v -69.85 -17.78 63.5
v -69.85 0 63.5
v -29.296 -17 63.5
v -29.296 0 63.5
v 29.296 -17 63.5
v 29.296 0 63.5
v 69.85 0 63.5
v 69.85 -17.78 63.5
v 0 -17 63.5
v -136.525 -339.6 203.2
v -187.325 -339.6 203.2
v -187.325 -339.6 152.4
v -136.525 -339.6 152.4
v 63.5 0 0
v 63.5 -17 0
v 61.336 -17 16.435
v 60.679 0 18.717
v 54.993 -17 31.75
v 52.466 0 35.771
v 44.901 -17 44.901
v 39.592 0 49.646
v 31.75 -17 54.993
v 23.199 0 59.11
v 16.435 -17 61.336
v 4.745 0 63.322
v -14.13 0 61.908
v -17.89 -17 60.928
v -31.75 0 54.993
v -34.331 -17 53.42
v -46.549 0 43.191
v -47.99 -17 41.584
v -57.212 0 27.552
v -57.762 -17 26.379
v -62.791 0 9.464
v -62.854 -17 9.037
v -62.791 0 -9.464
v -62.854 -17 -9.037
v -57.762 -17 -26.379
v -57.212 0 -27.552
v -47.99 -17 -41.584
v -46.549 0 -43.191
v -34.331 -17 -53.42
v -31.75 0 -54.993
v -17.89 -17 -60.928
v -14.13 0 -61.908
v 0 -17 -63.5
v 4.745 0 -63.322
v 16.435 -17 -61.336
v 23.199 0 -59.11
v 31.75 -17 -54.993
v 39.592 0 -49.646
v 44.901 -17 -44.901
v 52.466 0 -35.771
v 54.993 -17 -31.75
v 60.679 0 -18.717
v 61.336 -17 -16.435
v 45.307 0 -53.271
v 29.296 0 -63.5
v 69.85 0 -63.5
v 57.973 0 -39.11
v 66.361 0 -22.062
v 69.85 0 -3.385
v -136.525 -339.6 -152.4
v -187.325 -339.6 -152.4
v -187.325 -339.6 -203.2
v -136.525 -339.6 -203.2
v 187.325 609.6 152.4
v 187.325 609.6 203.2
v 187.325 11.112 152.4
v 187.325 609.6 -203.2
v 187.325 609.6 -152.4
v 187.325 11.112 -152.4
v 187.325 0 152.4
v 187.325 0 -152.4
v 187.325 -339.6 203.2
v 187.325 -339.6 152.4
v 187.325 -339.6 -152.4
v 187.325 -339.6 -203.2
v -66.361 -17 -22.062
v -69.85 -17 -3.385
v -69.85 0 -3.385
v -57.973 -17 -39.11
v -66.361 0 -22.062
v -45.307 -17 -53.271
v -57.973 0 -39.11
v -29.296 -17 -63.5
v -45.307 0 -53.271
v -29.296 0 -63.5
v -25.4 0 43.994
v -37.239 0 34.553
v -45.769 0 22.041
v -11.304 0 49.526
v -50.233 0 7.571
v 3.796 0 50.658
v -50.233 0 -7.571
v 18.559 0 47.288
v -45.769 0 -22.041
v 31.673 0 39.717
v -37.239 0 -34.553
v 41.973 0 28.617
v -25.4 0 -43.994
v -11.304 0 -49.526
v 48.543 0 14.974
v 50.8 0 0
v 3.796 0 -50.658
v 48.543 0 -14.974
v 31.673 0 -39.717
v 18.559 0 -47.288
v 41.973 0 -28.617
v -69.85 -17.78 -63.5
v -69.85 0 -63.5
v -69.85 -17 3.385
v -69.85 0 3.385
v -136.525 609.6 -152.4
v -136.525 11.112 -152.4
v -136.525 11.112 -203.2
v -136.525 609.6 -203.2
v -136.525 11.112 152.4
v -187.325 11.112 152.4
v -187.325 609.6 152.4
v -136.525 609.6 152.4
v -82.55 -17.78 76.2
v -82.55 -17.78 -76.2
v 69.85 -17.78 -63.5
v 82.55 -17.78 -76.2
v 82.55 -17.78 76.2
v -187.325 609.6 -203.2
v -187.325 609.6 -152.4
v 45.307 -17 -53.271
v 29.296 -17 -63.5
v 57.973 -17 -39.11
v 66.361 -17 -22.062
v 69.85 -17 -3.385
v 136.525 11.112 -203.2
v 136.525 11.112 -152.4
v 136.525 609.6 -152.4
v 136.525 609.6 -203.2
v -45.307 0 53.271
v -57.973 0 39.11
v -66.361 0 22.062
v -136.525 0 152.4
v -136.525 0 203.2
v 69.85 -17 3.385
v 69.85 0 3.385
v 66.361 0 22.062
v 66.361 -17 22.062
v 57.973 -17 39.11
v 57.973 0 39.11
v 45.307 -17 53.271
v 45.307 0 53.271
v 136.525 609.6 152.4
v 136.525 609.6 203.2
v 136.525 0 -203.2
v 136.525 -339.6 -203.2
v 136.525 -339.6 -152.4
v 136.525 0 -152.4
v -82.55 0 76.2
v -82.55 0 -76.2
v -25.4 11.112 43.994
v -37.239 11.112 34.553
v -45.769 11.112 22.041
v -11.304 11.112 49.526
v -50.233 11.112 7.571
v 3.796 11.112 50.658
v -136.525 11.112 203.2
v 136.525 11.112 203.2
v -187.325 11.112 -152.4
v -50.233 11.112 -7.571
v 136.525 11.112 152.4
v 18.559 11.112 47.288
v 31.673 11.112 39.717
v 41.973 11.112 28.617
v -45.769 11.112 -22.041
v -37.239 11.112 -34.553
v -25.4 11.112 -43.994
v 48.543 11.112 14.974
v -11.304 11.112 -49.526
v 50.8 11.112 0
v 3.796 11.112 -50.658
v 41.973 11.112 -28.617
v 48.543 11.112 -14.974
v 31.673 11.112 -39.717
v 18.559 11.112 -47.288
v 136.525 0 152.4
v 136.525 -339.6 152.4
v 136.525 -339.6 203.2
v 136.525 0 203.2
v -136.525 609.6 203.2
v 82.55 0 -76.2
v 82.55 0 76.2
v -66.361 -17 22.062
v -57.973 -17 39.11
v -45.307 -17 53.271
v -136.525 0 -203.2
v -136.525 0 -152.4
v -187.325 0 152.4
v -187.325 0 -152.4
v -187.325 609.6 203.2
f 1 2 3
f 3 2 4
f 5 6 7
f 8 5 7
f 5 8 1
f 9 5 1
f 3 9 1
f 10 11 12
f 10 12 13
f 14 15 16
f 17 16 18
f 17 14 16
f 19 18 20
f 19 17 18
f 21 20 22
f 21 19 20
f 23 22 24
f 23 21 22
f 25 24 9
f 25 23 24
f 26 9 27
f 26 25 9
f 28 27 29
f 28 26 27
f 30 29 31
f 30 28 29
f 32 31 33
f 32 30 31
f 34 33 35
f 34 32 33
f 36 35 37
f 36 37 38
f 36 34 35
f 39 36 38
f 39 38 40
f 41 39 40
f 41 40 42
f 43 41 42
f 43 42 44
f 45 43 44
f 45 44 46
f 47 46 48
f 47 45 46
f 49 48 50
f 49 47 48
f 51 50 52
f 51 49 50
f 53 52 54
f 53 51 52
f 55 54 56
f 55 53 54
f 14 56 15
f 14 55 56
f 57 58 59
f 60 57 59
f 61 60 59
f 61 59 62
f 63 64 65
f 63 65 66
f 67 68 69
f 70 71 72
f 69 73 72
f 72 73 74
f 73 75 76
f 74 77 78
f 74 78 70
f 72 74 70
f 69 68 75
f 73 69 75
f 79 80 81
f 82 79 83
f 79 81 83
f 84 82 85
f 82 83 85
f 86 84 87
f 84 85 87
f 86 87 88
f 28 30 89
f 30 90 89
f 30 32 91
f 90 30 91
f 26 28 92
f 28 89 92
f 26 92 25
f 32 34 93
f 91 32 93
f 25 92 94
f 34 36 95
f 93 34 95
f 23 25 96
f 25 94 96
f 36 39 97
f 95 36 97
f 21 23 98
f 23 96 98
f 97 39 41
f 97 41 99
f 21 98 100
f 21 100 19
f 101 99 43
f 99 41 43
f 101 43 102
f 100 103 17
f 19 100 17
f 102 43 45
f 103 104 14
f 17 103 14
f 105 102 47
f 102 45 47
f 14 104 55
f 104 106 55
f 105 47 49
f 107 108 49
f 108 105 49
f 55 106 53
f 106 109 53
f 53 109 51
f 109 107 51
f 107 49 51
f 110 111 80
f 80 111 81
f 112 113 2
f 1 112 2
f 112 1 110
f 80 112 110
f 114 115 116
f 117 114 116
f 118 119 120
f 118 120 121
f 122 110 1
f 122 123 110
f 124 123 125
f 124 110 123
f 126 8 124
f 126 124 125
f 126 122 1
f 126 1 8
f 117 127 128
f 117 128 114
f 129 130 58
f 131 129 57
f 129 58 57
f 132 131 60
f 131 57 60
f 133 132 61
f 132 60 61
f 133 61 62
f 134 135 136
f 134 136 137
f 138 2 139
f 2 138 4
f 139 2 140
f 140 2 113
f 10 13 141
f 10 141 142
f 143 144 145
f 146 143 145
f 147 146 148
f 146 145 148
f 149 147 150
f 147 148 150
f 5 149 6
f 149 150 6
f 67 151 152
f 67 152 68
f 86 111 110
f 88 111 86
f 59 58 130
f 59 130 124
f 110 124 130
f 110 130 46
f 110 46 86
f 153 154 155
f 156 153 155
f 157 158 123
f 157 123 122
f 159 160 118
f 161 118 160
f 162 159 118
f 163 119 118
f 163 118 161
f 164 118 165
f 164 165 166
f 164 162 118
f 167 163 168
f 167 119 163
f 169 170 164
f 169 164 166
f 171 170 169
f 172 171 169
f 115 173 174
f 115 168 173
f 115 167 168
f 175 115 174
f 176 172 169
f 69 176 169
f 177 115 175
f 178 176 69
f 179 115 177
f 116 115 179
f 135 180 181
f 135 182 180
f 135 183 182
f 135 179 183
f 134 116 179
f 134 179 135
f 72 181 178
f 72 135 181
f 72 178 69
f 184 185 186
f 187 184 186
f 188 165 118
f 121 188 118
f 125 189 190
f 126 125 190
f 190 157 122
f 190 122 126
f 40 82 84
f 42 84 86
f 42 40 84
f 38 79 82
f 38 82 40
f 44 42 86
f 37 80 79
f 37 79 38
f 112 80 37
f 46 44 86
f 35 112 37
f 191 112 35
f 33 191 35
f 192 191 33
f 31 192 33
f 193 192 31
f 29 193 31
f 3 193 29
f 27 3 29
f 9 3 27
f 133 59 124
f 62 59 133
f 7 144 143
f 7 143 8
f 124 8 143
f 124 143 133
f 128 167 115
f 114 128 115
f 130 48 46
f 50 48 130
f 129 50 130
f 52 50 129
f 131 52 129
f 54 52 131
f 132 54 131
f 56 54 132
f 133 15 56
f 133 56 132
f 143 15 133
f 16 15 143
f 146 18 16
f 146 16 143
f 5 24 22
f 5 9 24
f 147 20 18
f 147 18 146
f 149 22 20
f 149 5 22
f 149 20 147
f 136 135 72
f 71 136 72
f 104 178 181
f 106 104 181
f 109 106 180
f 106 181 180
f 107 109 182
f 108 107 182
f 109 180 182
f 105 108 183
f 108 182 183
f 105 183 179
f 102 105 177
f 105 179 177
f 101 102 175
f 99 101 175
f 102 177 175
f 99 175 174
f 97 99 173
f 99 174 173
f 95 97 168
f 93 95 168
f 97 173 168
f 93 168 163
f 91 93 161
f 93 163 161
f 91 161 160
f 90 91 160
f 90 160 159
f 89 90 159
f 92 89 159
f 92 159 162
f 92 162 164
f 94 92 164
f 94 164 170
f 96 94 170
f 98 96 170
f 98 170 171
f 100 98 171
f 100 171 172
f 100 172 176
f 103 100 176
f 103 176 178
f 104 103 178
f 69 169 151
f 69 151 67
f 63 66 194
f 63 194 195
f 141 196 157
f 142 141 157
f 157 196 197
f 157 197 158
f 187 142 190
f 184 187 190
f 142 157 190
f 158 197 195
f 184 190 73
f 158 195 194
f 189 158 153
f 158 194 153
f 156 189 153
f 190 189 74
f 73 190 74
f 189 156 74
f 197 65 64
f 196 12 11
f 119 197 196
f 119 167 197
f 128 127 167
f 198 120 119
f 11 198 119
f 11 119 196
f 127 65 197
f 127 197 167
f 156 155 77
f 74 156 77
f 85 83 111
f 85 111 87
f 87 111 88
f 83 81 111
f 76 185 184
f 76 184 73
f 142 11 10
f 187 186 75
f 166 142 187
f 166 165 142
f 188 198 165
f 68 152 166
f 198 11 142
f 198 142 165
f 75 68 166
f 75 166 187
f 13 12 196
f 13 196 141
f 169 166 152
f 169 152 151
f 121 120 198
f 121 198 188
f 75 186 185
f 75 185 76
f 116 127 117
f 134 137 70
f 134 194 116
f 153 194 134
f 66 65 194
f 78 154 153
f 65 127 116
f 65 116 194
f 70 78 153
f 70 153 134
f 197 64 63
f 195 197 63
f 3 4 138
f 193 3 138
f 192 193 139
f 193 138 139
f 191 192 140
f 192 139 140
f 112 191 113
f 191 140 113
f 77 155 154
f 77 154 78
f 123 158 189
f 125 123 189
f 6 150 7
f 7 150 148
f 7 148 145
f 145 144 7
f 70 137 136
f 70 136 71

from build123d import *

# Parameters (mm, degrees)
BOSS_EXTRUDE2_DEPTH  = 11.1125
SKETCH1_11_W         = 50.8
SKETCH1_11_H         = 50.8
BOSS_EXTRUDE3_DEPTH  = 609.6
SKETCH1_12_W         = 50.8
SKETCH1_12_H         = 50.8
BOSS_EXTRUDE4_DEPTH  = 609.6
SKETCH1_13_W         = 50.8
SKETCH1_13_H         = 50.8
BOSS_EXTRUDE5_DEPTH  = 609.6
SKETCH1_14_W         = 50.8
SKETCH1_14_H         = 50.8
BOSS_EXTRUDE6_DEPTH  = 609.6
SKETCH4_R            = 50.8
CUT_EXTRUDE2_DEPTH   = 12.1125
SKETCH5_W            = 165.1
SKETCH5_H            = 152.4
SKETCH5_W_2          = 139.7
SKETCH5_H_2          = 127
BOSS_EXTRUDE8_DEPTH  = 17.78
SKETCH13_W           = 50.8
SKETCH13_H           = 50.8
BOSS_EXTRUDE13_DEPTH = 339.6
SKETCH15_R           = 69.931982246
SKETCH15_R_2         = 63.5
BOSS_EXTRUDE14_DEPTH = 17


with BuildPart() as part:
    # Sketch1 → Boss-Extrude2 (new body)
    with BuildSketch(Plane(origin=(0, 0, 0), x_dir=(1, 0, 0), z_dir=(0, 1, 0))):
        Polygon((-136.525, 152.4), (-187.325, 152.4), (-187.325, -203.2), (187.325, -203.2), (187.325, 203.2), (-136.525, 203.2), align=None)
    extrude(amount=BOSS_EXTRUDE2_DEPTH)

    # Sketch1<11> → Boss-Extrude3 (add)
    with BuildSketch(Plane(origin=(0, 0, 0), x_dir=(1, 0, 0), z_dir=(0, 1, 0))):
        with Locations((-161.925, 177.8)):
            Rectangle(SKETCH1_11_W, SKETCH1_11_H)
    extrude(amount=BOSS_EXTRUDE3_DEPTH)

    # Sketch1<12> → Boss-Extrude4 (add)
    with BuildSketch(Plane(origin=(0, 0, 0), x_dir=(1, 0, 0), z_dir=(0, 1, 0))):
        with Locations((-161.925, -177.8)):
            Rectangle(SKETCH1_12_W, SKETCH1_12_H)
    extrude(amount=BOSS_EXTRUDE4_DEPTH)

    # Sketch1<13> → Boss-Extrude5 (add)
    with BuildSketch(Plane(origin=(0, 0, 0), x_dir=(1, 0, 0), z_dir=(0, 1, 0))):
        with Locations((161.925, 177.8)):
            Rectangle(SKETCH1_13_W, SKETCH1_13_H)
    extrude(amount=BOSS_EXTRUDE5_DEPTH)

    # Sketch1<14> → Boss-Extrude6 (add)
    with BuildSketch(Plane(origin=(0, 0, 0), x_dir=(1, 0, 0), z_dir=(0, 1, 0))):
        with Locations((161.925, -177.8)):
            Rectangle(SKETCH1_14_W, SKETCH1_14_H)
    extrude(amount=BOSS_EXTRUDE6_DEPTH)

    # Sketch4 → Cut-Extrude2 (cut, through all)
    with BuildSketch(Plane(origin=(0, 11.1125, 0), x_dir=(1, 0, 0), z_dir=(0, 1, 0))):
        Circle(SKETCH4_R)
    extrude(amount=-CUT_EXTRUDE2_DEPTH, mode=Mode.SUBTRACT)

    # Sketch5 → Boss-Extrude8 (add)
    with BuildSketch(Plane.XZ):
        Rectangle(SKETCH5_W, SKETCH5_H)
        Rectangle(SKETCH5_W_2, SKETCH5_H_2, mode=Mode.SUBTRACT)
    extrude(amount=BOSS_EXTRUDE8_DEPTH)

    # Sketch13 → Boss-Extrude13 (add)
    with BuildSketch(Plane.XZ):
        with Locations((-161.925, 177.8)):
            Rectangle(SKETCH13_W, SKETCH13_H)
        with Locations((161.925, 177.8)):
            Rectangle(SKETCH13_W, SKETCH13_H)
        with Locations((161.925, -177.8)):
            Rectangle(SKETCH13_W, SKETCH13_H)
        with Locations((-161.925, -177.8)):
            Rectangle(SKETCH13_W, SKETCH13_H)
    extrude(amount=BOSS_EXTRUDE13_DEPTH)

    # Sketch15 → Boss-Extrude14 (add)
    with BuildSketch(Plane.XZ):
        Circle(SKETCH15_R)
        Circle(SKETCH15_R_2, mode=Mode.SUBTRACT)
    extrude(amount=BOSS_EXTRUDE14_DEPTH)


solid = part.part
